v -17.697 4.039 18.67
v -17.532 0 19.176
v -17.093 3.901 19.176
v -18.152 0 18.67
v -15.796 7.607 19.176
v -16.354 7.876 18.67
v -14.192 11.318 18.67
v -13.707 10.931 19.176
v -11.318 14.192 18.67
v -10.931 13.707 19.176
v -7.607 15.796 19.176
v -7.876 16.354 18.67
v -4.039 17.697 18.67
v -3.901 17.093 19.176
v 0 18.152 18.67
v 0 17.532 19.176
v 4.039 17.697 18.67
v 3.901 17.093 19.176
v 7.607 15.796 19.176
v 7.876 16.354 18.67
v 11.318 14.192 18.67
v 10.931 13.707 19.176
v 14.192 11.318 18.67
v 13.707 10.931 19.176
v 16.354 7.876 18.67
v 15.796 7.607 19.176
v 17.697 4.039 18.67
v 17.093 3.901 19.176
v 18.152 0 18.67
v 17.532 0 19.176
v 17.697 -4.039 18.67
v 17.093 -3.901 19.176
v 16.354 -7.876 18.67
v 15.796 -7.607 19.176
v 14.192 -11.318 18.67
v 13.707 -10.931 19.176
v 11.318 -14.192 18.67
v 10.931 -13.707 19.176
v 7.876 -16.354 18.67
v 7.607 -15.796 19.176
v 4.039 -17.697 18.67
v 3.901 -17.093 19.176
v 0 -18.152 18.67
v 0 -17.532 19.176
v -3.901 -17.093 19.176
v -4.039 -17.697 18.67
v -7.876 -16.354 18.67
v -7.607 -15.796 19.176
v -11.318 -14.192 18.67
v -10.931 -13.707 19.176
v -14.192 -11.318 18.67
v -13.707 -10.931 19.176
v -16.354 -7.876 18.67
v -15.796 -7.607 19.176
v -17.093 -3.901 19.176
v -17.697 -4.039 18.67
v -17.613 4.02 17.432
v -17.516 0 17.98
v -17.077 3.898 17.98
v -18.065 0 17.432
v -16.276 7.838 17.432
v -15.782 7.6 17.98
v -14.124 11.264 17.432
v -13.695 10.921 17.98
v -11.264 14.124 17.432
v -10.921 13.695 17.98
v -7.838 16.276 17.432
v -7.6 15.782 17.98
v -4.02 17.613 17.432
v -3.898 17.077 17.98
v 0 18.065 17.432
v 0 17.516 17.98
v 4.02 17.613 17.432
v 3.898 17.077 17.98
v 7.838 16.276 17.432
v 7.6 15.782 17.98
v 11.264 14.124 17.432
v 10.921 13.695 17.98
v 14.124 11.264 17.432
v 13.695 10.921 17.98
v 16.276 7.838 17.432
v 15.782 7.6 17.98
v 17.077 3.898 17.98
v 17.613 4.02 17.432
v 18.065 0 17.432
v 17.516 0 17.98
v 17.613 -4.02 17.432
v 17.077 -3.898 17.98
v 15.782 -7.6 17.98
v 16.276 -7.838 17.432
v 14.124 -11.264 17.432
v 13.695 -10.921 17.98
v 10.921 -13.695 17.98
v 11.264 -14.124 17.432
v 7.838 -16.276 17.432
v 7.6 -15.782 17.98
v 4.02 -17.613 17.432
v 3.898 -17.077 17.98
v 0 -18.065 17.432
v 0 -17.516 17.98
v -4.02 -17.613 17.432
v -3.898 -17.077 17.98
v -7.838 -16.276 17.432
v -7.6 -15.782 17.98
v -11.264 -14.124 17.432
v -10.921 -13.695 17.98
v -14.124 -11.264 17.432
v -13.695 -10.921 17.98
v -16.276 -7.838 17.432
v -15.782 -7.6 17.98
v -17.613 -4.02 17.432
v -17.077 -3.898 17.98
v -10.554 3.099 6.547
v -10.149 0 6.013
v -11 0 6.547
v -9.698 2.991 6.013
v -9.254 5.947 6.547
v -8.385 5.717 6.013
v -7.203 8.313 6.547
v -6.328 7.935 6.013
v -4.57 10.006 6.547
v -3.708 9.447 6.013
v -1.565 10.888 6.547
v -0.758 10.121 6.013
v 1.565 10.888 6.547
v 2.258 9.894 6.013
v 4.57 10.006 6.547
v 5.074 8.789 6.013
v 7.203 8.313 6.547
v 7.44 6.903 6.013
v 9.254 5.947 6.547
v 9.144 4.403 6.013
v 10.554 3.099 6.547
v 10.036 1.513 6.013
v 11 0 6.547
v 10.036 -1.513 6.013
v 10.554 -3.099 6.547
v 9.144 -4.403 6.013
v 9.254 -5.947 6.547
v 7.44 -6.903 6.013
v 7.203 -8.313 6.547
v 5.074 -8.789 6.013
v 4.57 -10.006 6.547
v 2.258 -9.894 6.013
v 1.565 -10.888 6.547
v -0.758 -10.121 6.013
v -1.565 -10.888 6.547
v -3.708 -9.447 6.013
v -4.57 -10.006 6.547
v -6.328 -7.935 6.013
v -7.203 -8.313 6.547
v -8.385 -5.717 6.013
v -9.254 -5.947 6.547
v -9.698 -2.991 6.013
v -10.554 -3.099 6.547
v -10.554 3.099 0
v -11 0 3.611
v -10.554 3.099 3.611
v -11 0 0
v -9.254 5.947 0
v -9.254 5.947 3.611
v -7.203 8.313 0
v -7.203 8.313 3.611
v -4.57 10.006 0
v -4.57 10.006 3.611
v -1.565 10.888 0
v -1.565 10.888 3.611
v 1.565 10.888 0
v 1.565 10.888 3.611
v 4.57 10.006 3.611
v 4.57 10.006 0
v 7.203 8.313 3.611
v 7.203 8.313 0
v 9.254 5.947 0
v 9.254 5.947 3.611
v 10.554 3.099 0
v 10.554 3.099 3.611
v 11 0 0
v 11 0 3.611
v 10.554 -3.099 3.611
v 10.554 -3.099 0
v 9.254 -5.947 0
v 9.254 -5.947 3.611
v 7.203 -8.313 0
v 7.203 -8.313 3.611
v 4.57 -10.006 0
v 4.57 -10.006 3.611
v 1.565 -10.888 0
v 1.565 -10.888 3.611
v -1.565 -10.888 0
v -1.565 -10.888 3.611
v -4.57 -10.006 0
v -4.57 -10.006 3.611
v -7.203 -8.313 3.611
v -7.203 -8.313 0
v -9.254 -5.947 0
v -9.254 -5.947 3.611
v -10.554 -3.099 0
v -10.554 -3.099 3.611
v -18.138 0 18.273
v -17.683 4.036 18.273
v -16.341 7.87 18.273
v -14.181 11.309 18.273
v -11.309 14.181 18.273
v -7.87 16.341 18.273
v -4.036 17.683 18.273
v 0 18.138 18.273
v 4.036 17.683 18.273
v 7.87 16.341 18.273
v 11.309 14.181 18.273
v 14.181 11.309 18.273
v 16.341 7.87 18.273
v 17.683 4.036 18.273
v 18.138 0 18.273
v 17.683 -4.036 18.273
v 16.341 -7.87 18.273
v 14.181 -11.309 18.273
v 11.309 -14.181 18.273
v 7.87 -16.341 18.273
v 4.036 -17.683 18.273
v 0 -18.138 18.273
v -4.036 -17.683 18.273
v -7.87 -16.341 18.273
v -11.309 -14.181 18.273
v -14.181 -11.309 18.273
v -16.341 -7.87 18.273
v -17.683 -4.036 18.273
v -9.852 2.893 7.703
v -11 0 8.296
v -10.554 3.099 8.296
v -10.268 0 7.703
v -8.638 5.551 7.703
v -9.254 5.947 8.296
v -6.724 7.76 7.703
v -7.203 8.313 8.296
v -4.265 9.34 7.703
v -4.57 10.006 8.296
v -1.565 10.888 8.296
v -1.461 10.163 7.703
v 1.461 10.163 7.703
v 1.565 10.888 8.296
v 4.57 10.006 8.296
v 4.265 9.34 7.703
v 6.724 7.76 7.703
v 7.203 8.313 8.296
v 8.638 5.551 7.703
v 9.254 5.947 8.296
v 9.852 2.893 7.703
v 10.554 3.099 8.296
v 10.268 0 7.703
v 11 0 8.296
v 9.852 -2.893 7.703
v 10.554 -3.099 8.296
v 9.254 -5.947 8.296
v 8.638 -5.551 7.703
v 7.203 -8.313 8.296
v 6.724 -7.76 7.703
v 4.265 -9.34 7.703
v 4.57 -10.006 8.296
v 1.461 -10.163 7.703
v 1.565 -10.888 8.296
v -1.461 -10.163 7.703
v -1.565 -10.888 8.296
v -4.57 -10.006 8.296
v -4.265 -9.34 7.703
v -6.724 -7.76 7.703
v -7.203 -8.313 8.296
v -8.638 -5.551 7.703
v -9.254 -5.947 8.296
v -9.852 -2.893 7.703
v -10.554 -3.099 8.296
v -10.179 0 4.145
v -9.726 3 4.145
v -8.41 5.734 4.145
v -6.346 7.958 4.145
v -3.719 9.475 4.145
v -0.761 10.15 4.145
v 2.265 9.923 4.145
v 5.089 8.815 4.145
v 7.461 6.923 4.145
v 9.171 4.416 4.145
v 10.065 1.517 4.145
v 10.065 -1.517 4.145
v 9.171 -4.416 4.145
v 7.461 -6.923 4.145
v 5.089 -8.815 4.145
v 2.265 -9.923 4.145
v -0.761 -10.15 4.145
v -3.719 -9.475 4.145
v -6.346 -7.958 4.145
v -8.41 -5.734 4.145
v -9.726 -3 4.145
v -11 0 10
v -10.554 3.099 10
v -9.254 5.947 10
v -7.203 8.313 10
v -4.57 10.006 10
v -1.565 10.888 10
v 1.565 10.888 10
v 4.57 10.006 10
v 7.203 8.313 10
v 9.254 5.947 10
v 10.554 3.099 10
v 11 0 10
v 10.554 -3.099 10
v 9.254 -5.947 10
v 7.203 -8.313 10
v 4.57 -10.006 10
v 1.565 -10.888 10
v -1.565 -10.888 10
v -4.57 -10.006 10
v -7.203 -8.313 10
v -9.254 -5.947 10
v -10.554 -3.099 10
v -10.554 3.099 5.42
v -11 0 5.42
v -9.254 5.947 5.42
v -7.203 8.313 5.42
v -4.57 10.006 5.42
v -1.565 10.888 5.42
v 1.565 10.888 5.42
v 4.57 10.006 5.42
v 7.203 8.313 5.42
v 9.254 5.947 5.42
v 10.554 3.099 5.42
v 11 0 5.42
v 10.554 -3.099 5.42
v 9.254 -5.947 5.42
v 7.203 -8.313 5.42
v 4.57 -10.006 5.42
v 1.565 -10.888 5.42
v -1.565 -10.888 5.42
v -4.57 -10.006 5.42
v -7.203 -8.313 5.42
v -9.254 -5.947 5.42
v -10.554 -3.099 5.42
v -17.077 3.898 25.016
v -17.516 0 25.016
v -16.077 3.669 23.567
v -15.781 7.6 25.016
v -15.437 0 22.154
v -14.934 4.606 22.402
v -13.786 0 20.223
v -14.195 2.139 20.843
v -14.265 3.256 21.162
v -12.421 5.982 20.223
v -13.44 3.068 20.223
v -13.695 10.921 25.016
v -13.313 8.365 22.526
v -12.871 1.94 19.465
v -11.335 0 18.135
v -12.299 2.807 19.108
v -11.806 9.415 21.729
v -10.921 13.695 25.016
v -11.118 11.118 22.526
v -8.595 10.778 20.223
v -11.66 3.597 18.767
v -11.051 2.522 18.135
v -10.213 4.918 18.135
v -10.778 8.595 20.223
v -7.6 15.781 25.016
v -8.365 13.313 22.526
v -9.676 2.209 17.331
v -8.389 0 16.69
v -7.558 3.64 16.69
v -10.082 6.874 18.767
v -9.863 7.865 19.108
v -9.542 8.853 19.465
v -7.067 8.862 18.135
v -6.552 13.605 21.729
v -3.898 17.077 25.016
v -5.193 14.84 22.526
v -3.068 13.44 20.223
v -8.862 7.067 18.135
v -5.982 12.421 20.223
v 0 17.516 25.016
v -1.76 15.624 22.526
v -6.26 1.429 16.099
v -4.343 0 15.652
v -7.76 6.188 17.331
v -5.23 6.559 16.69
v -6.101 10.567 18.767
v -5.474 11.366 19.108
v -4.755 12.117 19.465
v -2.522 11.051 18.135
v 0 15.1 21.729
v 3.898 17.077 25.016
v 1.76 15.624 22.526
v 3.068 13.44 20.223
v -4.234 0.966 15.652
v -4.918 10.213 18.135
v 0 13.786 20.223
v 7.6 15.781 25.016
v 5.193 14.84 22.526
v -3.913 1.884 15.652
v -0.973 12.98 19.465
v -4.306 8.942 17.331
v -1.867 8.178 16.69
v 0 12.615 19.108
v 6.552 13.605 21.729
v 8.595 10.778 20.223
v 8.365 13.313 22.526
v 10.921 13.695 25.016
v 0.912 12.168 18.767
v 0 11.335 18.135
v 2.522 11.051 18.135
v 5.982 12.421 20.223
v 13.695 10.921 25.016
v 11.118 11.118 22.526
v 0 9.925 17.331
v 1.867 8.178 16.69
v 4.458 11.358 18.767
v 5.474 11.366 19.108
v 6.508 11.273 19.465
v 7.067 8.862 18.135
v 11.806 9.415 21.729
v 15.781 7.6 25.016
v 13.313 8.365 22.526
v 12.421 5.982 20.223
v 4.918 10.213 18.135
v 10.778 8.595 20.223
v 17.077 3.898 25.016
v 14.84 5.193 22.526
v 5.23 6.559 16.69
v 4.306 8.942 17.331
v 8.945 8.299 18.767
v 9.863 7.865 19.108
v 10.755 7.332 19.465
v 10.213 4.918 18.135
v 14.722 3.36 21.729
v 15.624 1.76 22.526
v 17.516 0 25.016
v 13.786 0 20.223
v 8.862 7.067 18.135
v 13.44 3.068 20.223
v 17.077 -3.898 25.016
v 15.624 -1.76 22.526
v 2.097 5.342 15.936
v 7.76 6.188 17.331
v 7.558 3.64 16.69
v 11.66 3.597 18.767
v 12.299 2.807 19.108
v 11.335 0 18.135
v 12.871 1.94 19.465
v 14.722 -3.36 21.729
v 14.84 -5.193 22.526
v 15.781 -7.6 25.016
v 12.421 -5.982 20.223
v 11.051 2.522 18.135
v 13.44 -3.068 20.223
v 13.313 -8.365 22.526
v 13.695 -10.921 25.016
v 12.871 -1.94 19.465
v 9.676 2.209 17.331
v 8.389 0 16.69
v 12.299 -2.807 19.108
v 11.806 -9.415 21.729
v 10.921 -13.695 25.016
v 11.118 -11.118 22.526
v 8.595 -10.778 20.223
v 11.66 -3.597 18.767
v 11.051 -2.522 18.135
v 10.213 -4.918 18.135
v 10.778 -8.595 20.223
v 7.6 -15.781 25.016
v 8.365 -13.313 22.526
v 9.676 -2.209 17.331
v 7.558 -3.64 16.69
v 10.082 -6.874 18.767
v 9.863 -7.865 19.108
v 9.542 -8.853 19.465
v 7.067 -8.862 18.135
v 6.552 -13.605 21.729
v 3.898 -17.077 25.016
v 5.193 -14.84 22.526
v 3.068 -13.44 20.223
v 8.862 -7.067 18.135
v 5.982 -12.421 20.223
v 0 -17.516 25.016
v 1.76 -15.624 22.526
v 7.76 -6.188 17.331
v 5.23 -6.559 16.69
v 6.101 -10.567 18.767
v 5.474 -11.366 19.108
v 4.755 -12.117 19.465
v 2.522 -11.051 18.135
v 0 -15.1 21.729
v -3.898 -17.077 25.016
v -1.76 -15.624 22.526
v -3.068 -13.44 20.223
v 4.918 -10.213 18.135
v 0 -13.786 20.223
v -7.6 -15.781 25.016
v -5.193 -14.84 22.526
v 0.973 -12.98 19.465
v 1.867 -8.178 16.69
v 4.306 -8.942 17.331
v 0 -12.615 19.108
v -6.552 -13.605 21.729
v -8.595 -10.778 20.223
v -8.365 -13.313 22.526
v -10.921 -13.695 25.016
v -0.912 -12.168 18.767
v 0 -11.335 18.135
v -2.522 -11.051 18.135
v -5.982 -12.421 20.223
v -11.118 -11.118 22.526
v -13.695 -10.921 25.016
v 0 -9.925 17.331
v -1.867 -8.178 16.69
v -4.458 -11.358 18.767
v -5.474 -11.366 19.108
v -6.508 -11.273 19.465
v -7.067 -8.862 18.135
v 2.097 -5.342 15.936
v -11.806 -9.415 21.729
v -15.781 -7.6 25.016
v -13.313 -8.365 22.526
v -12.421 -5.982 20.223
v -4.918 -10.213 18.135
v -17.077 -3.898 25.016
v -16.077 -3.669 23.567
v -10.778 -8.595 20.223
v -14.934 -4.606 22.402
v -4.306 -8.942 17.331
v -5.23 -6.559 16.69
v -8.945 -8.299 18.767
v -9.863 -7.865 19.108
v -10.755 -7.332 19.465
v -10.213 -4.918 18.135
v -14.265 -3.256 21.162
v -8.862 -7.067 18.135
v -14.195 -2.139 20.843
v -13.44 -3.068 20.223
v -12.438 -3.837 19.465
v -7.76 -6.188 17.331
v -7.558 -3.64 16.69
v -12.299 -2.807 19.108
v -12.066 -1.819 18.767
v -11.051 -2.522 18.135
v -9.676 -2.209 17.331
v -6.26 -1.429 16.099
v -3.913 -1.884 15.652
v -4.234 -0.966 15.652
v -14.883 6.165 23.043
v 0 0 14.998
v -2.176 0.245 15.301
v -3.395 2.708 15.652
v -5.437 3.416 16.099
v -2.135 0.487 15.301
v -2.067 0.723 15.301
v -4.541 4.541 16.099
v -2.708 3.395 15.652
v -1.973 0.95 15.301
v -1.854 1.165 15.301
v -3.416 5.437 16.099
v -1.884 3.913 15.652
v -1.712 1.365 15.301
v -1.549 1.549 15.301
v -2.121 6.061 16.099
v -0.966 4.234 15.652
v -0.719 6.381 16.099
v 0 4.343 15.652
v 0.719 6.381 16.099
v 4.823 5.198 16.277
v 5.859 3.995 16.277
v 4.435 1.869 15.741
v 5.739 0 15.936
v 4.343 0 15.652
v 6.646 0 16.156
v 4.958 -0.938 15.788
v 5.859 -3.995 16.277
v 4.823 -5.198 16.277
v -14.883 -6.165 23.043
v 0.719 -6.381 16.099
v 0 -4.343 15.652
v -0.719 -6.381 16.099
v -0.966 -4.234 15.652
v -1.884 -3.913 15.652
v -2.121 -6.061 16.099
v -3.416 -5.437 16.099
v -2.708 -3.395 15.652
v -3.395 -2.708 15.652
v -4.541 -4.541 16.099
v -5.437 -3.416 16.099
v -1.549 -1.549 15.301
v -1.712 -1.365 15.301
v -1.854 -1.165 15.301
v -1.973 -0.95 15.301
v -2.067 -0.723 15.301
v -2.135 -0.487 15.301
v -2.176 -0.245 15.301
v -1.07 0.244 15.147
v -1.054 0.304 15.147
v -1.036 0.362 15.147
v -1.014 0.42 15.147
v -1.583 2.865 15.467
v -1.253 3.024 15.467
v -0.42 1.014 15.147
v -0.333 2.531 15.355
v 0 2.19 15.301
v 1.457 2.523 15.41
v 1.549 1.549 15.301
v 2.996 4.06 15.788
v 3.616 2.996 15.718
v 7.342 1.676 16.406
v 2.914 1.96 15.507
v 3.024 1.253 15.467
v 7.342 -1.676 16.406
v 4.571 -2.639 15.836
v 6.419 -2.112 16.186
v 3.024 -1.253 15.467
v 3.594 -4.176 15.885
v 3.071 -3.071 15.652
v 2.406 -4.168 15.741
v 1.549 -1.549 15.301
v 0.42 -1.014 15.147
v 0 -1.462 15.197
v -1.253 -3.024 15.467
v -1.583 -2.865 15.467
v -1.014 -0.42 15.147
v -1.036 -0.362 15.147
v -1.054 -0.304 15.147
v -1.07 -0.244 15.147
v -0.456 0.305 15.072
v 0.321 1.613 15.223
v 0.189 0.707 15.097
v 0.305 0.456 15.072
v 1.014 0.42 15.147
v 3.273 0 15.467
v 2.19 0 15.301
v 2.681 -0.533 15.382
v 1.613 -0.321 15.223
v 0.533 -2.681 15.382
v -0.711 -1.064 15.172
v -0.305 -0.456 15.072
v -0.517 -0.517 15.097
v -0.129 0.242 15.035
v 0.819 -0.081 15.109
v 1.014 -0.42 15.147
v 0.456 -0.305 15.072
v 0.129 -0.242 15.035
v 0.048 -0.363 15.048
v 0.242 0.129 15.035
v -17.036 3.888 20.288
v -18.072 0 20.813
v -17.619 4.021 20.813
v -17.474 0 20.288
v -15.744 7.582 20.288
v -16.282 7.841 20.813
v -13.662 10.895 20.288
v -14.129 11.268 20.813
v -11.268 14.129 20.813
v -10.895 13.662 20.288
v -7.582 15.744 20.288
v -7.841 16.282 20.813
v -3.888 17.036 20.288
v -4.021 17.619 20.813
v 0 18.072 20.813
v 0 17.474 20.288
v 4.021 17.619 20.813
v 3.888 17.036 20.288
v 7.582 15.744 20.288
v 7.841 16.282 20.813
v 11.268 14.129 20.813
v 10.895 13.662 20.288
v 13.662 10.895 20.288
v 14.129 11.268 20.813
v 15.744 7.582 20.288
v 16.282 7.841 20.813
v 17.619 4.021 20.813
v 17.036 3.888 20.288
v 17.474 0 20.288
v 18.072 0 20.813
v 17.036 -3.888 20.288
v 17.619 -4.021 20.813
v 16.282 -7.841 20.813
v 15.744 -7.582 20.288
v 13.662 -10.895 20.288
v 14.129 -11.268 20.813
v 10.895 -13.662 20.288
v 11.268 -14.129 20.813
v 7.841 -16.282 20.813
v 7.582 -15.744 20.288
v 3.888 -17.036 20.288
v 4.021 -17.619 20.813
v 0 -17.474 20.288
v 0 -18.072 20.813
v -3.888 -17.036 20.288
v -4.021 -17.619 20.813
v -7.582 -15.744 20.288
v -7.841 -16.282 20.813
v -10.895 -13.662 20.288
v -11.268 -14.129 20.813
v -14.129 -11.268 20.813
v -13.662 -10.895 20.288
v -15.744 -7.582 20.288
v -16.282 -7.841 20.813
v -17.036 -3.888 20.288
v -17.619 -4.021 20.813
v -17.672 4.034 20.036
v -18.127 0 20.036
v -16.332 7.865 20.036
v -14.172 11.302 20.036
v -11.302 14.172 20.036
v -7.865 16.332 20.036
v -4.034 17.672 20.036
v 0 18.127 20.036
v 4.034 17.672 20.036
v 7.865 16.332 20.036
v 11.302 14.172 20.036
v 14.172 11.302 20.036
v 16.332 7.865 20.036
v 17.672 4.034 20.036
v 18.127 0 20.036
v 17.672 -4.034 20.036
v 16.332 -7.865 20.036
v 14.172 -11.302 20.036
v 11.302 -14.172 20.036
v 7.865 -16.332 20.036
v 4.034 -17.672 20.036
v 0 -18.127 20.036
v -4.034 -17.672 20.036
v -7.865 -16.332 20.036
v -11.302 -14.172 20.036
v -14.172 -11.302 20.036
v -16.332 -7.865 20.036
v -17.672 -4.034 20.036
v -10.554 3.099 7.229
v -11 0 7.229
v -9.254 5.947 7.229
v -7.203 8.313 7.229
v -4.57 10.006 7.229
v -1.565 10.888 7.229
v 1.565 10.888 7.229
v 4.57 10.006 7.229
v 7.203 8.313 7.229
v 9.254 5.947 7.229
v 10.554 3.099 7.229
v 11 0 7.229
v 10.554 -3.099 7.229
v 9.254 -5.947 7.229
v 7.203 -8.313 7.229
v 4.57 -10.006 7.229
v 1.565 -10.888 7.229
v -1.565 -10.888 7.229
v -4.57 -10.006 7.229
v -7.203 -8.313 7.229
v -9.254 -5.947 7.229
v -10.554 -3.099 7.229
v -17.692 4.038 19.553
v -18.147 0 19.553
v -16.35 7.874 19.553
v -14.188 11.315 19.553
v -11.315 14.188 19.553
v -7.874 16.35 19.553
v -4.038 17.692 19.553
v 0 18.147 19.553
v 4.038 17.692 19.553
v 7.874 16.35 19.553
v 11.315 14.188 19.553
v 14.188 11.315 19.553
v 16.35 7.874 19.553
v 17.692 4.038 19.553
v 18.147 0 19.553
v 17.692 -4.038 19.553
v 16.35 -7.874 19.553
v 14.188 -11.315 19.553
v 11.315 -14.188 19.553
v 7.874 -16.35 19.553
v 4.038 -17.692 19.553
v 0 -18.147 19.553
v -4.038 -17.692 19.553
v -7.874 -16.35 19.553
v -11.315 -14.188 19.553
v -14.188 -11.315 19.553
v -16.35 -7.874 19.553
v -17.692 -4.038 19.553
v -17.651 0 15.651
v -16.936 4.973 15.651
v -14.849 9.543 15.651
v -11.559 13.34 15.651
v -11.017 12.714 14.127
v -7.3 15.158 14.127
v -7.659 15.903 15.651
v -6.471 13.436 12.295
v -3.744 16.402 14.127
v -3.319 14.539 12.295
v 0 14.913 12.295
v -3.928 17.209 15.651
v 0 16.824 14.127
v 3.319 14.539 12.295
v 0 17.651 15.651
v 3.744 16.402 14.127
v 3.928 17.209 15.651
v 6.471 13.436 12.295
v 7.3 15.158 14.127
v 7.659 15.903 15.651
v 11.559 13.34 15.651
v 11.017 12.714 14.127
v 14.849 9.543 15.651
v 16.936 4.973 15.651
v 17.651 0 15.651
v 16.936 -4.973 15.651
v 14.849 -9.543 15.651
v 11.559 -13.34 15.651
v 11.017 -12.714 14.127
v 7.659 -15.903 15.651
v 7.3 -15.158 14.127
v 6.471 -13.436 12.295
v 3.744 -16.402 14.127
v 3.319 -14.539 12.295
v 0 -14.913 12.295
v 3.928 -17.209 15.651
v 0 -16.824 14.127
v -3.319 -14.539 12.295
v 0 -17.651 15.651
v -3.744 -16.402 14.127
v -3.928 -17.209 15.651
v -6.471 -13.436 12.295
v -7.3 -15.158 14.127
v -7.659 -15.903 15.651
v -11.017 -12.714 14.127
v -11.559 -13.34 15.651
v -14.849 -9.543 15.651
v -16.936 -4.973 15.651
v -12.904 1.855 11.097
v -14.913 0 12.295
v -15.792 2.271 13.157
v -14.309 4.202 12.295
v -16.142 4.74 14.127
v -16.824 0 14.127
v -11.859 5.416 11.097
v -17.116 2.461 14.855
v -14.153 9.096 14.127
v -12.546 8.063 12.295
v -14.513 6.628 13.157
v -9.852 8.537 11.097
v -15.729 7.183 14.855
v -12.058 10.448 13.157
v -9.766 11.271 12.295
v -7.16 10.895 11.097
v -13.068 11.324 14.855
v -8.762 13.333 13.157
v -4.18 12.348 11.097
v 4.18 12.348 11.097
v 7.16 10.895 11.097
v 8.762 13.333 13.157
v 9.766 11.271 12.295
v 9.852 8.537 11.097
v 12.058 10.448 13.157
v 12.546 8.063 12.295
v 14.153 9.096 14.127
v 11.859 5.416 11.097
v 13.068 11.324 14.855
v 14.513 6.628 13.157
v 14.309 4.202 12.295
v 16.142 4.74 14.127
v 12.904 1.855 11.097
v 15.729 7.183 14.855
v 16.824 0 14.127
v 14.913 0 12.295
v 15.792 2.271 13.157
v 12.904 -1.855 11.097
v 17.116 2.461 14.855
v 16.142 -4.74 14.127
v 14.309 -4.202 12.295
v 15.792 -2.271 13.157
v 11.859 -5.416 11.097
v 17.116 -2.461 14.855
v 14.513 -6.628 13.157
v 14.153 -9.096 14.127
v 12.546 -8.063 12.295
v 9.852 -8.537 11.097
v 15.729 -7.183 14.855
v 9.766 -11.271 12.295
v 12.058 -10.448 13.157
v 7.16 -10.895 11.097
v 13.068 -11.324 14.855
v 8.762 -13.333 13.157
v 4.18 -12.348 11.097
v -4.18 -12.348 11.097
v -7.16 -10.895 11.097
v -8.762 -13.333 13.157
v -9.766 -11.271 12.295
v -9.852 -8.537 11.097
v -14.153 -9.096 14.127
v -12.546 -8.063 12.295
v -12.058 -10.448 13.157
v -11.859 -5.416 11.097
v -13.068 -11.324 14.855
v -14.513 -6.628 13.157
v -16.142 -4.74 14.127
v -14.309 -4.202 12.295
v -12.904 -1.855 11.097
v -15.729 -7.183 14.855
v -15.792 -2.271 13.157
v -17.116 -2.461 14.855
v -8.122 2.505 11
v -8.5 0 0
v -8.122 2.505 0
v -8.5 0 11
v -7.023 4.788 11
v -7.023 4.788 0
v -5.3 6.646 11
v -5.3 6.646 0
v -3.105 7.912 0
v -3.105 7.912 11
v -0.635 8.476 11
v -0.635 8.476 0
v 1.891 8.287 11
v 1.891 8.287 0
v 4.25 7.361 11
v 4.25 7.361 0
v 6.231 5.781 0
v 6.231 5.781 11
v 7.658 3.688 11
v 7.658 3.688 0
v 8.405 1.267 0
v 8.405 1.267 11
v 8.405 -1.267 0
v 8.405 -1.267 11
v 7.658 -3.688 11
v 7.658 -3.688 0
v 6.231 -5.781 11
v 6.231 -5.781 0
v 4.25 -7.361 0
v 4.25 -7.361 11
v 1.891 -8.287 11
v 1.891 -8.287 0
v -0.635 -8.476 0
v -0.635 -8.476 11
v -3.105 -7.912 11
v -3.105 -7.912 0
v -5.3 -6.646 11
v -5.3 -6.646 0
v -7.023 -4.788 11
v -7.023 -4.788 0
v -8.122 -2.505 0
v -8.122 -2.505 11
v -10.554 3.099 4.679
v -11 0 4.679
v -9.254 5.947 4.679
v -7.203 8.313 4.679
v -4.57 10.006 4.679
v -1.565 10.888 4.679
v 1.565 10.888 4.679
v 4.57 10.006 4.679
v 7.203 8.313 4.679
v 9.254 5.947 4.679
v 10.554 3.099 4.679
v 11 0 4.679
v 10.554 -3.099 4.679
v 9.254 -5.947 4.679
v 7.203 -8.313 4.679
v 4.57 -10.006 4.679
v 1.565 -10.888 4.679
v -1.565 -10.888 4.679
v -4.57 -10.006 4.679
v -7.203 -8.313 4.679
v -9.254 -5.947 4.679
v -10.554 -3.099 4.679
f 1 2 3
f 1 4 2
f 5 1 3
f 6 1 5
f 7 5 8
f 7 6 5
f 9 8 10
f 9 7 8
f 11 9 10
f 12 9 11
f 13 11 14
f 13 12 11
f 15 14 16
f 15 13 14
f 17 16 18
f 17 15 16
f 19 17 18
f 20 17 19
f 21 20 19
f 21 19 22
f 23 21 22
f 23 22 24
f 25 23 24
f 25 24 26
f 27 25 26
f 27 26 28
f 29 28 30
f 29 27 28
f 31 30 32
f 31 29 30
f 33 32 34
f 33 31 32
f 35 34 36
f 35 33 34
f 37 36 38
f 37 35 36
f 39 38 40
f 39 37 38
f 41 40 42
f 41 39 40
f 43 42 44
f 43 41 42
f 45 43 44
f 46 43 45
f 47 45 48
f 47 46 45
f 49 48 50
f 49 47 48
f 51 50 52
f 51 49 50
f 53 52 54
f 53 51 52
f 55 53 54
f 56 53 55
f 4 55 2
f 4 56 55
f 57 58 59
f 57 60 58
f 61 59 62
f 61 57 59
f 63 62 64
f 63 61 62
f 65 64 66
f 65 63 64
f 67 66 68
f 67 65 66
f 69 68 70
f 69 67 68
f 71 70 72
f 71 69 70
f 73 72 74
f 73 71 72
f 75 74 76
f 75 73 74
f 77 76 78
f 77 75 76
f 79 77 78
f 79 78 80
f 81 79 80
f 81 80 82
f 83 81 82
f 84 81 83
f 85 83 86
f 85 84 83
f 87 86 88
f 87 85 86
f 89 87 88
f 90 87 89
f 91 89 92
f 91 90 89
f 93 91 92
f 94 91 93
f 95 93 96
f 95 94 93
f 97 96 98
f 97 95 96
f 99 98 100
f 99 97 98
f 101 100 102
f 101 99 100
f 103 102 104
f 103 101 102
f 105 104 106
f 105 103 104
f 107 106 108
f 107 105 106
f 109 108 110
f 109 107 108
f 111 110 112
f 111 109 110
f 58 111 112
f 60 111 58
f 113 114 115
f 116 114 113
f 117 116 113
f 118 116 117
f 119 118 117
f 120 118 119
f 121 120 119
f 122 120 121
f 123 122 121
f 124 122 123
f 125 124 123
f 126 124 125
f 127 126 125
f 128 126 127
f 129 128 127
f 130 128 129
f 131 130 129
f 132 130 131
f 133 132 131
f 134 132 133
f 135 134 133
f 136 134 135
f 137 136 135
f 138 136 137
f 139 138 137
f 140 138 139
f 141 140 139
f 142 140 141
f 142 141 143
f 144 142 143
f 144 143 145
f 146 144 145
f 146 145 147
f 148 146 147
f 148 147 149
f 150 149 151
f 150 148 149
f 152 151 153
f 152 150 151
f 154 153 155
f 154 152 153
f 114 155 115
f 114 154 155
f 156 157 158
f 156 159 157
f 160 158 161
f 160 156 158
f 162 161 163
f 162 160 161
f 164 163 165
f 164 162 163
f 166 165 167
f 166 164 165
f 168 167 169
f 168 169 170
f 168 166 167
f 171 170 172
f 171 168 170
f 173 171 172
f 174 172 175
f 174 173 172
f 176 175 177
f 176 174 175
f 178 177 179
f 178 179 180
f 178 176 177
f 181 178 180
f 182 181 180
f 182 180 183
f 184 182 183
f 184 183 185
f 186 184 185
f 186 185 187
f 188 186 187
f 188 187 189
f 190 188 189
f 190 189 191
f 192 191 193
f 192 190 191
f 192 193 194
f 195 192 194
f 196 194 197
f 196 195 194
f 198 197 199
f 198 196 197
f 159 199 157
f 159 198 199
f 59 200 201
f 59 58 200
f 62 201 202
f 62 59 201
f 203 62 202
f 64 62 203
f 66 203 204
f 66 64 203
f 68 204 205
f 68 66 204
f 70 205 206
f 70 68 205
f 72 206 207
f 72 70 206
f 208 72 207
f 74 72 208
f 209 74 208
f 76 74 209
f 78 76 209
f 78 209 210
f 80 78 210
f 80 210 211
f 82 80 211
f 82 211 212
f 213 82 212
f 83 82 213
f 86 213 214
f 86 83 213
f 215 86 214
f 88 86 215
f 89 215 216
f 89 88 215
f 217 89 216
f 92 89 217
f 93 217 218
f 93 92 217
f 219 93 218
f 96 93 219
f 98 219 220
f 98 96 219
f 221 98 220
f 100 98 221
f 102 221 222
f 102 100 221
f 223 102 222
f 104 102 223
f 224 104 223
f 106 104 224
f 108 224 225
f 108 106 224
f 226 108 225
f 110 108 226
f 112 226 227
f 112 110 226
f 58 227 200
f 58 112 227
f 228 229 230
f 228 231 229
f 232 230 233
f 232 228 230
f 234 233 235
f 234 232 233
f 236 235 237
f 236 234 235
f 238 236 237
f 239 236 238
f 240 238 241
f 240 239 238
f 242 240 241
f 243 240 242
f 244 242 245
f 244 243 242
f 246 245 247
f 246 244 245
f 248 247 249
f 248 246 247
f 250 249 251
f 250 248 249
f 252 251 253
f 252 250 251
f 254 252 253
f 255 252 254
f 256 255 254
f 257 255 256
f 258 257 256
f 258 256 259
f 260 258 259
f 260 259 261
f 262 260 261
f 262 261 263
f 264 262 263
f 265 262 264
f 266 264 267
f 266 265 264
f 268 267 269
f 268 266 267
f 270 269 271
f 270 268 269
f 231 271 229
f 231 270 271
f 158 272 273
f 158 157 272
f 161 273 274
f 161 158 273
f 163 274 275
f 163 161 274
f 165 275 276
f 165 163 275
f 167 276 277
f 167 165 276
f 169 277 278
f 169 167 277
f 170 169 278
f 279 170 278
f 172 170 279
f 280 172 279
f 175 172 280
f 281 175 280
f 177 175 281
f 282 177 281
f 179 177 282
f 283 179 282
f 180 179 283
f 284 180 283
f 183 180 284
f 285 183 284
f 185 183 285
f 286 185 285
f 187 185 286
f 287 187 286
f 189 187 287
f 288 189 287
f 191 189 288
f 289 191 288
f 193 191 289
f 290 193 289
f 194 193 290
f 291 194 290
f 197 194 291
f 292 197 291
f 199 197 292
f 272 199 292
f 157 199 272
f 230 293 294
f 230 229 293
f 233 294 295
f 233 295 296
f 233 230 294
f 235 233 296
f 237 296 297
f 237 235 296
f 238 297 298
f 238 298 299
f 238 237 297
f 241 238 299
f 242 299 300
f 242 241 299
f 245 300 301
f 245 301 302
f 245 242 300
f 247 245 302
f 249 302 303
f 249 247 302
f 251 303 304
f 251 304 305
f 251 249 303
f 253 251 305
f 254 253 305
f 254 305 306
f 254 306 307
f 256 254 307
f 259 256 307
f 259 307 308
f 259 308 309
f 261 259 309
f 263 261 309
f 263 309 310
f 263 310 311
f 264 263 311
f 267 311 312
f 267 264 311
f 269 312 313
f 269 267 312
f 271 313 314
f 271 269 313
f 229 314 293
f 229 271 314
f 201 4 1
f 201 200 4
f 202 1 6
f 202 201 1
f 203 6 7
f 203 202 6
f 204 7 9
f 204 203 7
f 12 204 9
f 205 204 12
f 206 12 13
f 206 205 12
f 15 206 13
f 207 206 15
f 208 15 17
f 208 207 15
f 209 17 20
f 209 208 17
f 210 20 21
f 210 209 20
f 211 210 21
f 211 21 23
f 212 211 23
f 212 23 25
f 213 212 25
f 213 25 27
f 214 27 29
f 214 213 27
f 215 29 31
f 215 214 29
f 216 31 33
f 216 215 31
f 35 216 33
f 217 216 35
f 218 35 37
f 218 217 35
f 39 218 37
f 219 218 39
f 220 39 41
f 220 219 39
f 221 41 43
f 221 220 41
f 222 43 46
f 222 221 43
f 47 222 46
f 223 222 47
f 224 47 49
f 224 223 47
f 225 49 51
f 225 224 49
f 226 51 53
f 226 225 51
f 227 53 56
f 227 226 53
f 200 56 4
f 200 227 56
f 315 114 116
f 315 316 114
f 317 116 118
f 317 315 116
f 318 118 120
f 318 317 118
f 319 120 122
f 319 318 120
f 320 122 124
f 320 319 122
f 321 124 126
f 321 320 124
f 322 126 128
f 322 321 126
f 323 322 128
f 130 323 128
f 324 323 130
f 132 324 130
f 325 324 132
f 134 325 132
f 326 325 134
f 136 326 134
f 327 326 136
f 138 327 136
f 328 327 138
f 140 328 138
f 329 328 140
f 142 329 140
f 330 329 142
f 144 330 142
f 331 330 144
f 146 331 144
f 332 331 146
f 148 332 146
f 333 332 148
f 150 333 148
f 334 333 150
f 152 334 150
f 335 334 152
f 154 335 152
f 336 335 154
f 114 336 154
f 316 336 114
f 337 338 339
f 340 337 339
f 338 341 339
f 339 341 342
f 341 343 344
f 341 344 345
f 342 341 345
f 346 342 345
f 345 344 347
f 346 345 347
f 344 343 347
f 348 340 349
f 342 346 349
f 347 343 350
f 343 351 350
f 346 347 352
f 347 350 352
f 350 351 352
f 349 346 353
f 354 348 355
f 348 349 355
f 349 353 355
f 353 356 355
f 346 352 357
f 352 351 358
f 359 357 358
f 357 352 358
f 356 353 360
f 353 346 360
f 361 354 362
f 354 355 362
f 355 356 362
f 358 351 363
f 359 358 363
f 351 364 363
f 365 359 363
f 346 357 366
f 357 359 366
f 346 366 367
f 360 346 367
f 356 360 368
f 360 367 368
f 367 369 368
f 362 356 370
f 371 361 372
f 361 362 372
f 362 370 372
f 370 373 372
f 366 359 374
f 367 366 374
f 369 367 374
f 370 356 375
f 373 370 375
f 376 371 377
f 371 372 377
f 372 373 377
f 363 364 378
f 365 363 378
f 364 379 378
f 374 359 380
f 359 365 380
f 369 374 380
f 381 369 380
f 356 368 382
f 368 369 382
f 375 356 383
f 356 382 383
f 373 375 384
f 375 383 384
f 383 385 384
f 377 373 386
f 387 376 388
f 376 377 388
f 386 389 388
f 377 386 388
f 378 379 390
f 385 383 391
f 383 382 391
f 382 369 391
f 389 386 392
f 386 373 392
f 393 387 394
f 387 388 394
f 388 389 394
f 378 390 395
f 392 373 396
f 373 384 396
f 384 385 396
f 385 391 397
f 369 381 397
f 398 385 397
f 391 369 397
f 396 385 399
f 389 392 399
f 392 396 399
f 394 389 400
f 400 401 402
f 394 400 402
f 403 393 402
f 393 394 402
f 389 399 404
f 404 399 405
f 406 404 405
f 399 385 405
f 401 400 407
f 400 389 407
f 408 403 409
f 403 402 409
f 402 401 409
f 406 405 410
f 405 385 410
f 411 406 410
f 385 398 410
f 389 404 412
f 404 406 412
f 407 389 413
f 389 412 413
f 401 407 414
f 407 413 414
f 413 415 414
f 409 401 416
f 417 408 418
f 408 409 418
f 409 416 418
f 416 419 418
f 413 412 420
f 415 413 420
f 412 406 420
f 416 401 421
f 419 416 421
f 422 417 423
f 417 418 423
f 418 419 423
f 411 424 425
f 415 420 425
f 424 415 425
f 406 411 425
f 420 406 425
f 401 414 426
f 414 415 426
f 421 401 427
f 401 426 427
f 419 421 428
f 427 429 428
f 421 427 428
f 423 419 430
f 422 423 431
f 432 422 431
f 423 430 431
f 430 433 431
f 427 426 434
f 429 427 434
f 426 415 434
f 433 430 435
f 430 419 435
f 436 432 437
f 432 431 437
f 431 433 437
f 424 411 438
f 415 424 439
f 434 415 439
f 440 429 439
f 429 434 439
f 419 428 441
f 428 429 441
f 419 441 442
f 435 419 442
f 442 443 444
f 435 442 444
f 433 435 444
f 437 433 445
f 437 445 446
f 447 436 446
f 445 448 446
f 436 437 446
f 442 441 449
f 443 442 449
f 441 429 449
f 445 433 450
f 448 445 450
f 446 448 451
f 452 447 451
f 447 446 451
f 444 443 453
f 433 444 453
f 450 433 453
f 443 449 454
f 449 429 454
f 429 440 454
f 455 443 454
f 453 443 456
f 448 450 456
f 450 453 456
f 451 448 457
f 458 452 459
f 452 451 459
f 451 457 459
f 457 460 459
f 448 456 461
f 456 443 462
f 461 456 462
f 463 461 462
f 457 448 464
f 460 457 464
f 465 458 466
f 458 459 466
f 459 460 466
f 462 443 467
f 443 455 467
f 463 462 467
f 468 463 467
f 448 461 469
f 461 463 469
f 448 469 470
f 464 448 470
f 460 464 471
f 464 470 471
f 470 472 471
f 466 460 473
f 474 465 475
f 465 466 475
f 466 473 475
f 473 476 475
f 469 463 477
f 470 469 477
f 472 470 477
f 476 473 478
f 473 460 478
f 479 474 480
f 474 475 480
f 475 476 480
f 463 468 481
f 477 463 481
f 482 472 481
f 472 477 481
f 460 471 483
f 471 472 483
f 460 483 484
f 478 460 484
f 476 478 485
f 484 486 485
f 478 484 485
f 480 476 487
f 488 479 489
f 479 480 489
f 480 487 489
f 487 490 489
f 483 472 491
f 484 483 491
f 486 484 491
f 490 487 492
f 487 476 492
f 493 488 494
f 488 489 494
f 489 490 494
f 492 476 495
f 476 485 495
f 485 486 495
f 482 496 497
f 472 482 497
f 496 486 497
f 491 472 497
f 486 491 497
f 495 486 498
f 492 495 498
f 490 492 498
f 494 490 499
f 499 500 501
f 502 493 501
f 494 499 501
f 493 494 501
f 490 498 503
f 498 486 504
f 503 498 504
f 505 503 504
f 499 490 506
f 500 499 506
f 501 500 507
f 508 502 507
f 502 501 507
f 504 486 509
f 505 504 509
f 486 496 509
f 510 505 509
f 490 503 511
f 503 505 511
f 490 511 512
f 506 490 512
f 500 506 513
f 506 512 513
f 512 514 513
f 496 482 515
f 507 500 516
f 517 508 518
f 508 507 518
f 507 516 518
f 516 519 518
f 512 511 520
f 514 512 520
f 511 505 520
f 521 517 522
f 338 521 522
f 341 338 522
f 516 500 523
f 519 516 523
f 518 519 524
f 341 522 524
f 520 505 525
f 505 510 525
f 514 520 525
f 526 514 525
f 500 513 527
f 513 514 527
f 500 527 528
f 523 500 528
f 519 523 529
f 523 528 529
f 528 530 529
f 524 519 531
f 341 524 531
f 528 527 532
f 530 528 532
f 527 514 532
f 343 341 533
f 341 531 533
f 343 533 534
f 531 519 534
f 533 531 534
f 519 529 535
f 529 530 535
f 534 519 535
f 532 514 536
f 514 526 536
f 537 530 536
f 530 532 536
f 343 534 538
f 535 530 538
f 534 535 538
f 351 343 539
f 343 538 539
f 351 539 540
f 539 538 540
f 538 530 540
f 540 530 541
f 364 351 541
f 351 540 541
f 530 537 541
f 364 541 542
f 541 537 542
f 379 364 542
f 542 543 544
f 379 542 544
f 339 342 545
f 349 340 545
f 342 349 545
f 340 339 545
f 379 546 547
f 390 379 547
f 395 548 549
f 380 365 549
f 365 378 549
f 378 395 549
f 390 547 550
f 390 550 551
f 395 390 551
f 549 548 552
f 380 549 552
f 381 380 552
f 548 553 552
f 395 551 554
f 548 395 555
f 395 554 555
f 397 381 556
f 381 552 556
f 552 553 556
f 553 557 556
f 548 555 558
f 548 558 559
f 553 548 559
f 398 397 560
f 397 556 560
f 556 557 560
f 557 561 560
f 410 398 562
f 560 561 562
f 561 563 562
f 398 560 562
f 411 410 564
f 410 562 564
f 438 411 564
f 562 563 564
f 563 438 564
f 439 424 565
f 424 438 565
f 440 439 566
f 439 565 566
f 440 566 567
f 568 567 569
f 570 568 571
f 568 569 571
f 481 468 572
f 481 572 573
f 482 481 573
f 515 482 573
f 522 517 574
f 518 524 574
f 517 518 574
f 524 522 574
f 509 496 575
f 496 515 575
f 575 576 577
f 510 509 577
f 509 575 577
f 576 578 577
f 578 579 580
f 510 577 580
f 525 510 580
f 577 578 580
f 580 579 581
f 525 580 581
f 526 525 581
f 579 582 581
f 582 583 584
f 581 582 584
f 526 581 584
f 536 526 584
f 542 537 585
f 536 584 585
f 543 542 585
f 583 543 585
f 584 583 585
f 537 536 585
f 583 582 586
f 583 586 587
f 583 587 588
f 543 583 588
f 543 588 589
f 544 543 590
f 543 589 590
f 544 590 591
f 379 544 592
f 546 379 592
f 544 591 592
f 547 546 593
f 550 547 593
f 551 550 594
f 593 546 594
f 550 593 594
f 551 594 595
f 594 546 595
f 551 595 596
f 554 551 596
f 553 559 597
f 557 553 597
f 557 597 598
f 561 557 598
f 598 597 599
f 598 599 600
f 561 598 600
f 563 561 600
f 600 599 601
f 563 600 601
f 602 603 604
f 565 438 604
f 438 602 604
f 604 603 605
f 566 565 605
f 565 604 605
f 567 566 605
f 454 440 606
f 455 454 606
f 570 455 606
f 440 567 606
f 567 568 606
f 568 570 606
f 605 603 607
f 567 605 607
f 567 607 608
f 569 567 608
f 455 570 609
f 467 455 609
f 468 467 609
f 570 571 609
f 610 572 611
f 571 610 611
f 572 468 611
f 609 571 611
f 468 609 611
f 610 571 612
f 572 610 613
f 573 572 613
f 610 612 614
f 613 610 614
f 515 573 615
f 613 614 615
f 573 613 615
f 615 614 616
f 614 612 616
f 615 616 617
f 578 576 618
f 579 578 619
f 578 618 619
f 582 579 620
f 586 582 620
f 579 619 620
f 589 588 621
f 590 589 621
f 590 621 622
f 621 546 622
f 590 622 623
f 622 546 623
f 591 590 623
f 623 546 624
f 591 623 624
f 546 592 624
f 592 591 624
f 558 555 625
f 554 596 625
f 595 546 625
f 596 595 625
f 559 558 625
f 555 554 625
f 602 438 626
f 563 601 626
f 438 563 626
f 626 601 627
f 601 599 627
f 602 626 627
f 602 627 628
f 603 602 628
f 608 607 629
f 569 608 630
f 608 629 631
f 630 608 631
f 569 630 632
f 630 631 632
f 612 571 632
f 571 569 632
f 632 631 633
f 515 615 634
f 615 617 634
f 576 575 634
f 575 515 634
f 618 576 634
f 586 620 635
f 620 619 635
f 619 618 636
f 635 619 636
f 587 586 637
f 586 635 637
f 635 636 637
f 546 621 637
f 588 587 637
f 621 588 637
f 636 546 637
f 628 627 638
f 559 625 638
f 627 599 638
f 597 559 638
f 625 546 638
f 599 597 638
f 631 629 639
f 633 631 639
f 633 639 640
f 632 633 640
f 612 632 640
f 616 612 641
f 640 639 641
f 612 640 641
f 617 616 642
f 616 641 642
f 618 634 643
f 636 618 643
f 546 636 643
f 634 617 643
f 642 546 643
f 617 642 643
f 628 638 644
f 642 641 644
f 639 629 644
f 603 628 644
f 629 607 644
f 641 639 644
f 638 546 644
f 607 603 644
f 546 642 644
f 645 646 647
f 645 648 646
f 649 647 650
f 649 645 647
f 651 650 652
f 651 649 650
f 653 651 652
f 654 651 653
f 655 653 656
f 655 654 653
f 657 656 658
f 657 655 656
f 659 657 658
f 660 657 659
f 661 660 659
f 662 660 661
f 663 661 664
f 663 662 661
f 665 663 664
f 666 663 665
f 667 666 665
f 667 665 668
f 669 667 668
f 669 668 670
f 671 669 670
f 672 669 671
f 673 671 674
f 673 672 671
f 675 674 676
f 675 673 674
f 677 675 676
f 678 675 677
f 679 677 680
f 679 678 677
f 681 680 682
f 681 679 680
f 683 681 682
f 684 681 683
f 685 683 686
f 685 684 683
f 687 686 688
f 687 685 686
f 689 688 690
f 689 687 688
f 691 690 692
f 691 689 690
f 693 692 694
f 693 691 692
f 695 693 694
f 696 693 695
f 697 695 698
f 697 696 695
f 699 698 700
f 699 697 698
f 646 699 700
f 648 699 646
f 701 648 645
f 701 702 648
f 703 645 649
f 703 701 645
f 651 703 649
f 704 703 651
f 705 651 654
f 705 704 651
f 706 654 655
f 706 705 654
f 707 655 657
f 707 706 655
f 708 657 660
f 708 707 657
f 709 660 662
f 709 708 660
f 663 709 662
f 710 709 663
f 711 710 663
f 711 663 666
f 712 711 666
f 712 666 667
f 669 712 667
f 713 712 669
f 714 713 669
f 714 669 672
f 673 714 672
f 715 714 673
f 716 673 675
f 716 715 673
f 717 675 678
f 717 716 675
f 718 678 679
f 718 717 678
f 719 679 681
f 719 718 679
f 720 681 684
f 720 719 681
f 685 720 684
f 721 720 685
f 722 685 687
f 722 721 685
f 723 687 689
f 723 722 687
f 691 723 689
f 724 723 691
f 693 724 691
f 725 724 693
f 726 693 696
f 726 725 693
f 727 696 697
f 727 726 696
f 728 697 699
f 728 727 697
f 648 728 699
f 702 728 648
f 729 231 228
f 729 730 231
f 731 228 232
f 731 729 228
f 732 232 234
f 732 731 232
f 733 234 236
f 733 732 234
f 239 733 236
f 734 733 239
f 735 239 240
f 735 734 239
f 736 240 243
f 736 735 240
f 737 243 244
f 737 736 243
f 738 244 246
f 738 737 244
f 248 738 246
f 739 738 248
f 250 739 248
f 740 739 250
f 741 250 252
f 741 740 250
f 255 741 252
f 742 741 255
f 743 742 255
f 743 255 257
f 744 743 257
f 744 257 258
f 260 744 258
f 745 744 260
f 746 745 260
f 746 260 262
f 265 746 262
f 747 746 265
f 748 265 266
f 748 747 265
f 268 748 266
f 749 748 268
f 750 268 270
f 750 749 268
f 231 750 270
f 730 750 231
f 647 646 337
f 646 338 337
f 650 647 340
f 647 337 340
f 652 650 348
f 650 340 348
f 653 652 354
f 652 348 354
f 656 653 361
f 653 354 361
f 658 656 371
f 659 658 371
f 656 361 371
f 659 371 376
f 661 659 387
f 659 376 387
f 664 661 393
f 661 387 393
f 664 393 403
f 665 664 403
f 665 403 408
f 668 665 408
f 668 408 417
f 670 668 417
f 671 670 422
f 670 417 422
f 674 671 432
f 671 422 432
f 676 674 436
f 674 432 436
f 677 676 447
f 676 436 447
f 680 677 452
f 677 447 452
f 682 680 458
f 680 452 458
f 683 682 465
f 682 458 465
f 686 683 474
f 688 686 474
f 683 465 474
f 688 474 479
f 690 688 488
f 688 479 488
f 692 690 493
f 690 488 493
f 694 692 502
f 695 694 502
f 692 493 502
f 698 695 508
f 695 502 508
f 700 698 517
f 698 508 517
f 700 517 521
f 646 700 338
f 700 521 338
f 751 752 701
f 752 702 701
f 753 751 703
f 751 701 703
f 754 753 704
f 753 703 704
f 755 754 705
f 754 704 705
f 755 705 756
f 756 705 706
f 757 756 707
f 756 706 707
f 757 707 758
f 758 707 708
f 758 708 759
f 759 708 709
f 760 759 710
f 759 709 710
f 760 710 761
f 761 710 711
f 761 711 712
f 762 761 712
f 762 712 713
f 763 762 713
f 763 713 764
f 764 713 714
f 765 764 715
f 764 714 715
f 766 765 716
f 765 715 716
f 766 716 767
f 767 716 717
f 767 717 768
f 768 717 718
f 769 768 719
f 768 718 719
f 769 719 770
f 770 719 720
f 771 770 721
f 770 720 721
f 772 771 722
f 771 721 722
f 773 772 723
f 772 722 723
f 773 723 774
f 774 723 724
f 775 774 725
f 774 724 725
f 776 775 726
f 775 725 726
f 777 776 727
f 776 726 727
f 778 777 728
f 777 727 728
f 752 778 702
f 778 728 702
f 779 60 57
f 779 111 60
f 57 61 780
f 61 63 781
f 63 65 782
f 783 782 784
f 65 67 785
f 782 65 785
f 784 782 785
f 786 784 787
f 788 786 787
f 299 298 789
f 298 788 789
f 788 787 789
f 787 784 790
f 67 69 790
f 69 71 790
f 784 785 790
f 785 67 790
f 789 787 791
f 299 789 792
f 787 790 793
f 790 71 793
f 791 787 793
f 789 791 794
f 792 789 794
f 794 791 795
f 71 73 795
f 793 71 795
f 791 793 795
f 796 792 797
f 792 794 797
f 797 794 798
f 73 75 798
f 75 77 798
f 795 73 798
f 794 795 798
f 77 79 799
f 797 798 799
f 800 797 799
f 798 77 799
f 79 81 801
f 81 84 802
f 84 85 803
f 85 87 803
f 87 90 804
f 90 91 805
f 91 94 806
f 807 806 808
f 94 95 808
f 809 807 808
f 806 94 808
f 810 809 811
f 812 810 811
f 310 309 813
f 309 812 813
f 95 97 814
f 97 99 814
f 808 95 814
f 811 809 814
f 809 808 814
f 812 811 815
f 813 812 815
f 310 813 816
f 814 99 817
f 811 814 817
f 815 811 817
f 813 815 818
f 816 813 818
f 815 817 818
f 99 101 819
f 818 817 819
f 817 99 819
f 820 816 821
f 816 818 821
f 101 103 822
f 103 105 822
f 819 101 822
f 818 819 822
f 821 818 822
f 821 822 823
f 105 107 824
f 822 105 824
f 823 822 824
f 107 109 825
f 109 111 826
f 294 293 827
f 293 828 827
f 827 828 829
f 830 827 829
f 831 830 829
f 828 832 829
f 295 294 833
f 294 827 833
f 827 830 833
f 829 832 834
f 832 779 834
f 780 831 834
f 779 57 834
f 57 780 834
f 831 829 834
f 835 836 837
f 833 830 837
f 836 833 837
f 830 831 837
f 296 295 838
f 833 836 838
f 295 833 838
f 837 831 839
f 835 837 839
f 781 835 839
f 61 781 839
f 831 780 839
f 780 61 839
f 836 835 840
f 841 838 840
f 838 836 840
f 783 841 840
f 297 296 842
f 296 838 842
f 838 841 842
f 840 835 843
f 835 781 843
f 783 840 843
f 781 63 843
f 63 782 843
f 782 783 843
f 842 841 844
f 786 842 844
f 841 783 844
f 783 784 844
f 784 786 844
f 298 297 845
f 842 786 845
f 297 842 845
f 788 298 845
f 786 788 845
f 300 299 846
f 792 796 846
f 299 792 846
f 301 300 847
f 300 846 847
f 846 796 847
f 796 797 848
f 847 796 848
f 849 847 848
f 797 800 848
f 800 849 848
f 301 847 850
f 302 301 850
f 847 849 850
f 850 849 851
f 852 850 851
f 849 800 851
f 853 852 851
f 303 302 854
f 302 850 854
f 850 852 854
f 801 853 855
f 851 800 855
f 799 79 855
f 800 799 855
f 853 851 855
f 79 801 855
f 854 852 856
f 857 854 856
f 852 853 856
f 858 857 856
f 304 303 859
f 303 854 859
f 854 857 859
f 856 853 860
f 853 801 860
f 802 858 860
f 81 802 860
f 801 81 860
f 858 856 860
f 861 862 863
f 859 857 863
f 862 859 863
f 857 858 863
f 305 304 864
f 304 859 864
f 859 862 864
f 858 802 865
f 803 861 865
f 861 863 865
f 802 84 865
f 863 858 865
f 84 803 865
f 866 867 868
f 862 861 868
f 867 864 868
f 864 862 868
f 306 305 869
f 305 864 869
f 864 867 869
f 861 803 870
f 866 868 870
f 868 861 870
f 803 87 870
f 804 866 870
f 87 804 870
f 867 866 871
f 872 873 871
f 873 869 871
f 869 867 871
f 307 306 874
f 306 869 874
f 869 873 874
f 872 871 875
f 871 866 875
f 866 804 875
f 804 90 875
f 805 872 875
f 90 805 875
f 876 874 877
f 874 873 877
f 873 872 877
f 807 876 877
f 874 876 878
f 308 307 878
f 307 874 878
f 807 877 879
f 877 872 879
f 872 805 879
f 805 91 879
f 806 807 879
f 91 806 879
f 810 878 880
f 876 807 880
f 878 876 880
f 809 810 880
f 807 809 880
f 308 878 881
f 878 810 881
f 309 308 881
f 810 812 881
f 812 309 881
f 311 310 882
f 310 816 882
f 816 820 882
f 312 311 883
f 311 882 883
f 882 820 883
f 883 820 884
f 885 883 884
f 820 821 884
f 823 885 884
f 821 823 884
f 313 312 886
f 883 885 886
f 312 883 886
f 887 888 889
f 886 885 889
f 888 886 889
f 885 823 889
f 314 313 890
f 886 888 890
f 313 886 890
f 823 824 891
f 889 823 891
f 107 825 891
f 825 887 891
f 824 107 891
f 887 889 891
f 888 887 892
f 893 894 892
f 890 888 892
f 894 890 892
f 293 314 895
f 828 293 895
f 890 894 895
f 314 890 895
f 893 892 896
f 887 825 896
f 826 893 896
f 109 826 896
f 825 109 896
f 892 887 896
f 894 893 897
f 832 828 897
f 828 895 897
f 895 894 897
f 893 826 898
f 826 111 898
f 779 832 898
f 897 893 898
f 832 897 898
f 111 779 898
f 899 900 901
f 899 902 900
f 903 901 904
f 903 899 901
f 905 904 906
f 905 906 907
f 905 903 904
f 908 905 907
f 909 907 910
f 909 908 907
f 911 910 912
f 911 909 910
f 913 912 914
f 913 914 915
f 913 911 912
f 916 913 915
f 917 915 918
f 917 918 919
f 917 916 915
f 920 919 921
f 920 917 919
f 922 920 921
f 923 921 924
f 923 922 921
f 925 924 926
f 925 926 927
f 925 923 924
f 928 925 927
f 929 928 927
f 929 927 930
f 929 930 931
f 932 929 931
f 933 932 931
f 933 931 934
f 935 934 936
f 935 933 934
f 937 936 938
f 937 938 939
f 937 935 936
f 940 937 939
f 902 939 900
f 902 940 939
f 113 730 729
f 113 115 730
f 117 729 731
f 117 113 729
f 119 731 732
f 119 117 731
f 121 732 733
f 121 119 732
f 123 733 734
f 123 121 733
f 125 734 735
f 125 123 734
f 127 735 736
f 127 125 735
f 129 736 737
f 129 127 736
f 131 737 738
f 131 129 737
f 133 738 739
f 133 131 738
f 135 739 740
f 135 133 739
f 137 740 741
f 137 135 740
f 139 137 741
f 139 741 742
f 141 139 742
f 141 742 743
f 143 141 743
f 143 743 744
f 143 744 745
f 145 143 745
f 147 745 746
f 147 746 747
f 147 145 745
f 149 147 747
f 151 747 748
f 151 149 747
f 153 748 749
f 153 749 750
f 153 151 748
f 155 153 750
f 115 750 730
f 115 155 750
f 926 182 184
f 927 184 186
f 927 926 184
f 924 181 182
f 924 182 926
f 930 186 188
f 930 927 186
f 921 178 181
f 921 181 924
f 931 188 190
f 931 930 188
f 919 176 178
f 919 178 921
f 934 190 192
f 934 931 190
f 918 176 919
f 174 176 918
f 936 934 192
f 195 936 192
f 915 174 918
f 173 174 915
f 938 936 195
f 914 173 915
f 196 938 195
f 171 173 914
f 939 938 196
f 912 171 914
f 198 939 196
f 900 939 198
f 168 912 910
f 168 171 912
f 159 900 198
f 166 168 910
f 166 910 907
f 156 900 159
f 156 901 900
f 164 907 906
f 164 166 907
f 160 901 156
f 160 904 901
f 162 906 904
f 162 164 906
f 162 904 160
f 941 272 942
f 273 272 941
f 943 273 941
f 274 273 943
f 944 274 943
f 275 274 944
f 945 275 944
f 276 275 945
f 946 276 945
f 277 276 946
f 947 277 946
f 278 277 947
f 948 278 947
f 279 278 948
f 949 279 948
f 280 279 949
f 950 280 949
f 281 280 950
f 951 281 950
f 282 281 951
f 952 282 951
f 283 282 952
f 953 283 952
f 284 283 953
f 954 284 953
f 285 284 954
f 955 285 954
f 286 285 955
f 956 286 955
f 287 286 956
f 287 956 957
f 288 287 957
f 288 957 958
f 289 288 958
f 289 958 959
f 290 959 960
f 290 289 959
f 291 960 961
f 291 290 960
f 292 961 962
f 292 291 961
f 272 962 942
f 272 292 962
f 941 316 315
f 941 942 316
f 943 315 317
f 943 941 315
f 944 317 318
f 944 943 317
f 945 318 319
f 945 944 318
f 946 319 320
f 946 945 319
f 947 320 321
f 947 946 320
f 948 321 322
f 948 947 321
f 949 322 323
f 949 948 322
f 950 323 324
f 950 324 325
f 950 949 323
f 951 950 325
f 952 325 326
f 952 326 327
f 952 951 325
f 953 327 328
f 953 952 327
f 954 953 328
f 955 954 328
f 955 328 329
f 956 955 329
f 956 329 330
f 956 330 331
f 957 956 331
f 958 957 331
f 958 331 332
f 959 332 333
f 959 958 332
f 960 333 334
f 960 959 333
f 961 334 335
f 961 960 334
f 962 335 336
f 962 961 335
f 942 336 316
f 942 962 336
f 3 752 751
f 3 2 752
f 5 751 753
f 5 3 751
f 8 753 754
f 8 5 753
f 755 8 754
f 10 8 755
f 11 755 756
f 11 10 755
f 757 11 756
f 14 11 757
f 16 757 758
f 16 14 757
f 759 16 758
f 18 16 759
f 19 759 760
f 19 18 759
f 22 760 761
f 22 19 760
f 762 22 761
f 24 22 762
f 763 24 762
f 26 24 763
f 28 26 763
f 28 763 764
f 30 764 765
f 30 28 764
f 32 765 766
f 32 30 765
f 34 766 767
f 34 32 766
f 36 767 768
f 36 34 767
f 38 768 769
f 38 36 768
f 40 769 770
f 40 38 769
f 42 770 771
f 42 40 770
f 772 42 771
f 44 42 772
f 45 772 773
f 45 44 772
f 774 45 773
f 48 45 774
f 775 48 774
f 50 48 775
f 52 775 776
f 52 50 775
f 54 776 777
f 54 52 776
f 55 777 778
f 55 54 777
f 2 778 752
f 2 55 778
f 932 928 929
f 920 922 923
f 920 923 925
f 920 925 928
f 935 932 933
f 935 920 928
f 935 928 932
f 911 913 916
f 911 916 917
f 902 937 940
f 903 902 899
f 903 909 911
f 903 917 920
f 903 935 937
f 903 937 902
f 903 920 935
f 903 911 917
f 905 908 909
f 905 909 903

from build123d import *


with BuildPart() as f1:
    # F0 (on Front) → F1 (revolve)
    with BuildSketch(Plane.XZ):
        with BuildLine():
            Line((-11, 0), (-8.5, 0))
            Line((-8.5, 0), (-8.5, 11))
            Line((-8.5, 11), (0, 11))
            Line((0, 11), (0, 14.9984406307))
            add(Edge.make_bspline(
                [(-17.5161305815, 25.0157564878), (-15.5815870923, 22.2602219345), (-11.5737005689, 16.5514488505), (-3.9459538942, 15.5279254568), (0, 14.9984406307)],
                knots=[0, 0, 0, 0, 0.4826841973, 1, 1, 1, 1], degree=3))
            add(Edge.make_bspline(
                [(-18.072174276, 20.8134150085), (-17.9563486733, 22.1708113356), (-17.7362396274, 23.5932839117), (-17.5161305815, 25.0157564878)],
                knots=[0.7979590462, 0.7979590462, 0.7979590462, 0.7979590462, 1, 1, 1, 1], degree=3))
            Line((-18.072174276, 20.8134150085), (-17.474169231, 20.2877648349))
            Line((-17.474169231, 20.2877648349), (-18.1267939942, 20.0359687694))
            add(Edge.make_bspline(
                [(-18.1473092364, 19.552679753), (-18.1424496564, 19.7125412352), (-18.1355480675, 19.8736769971), (-18.1267939942, 20.0359687694)],
                knots=[0.7343469252, 0.7343469252, 0.7343469252, 0.7343469252, 0.7590029372, 0.7590029372, 0.7590029372, 0.7590029372], degree=3))
            Line((-18.1473092364, 19.552679753), (-17.5323307281, 19.1758368702))
            Line((-17.5323307281, 19.1758368702), (-18.1519210677, 18.6704946689))
            Line((-18.1519210677, 18.6704946689), (-18.1375525664, 18.2734475453))
            Line((-18.1375525664, 18.2734475453), (-17.5164529661, 17.9795547089))
            Line((-17.5164529661, 17.9795547089), (-18.06547265, 17.4323181276))
            add(Edge.make_bspline(
                [(-11, 10), (-13.635437822, 11.3804638315), (-17.0741854324, 13.1817078836), (-17.9594871723, 16.5763849323), (-18.06547265, 17.4323181276)],
                knots=[0, 0, 0, 0, 0.4755880726, 0.6205524314, 0.6205524314, 0.6205524314, 0.6205524314], degree=3))
            Line((-11, 10), (-11, 8.2959206775))
            Line((-11, 8.2959206775), (-10.267551057, 7.7029233798))
            Line((-10.267551057, 7.7029233798), (-11, 7.2285258211))
            Line((-11, 7.2285258211), (-11, 6.5465788357))
            Line((-11, 6.5465788357), (-10.1489517838, 6.0128816403))
            Line((-10.1489517838, 6.0128816403), (-11, 5.4198848084))
            Line((-11, 5.4198848084), (-11, 4.678638652))
            Line((-11, 4.678638652), (-10.1786013693, 4.144940991))
            Line((-10.1786013693, 4.144940991), (-11, 3.6112440284))
            Line((-11, 3.6112440284), (-11, 0))
        make_face()
    revolve(axis=Axis((0, 0, 7.4992203154), (0, 0, -1)))


solid = f1.part
